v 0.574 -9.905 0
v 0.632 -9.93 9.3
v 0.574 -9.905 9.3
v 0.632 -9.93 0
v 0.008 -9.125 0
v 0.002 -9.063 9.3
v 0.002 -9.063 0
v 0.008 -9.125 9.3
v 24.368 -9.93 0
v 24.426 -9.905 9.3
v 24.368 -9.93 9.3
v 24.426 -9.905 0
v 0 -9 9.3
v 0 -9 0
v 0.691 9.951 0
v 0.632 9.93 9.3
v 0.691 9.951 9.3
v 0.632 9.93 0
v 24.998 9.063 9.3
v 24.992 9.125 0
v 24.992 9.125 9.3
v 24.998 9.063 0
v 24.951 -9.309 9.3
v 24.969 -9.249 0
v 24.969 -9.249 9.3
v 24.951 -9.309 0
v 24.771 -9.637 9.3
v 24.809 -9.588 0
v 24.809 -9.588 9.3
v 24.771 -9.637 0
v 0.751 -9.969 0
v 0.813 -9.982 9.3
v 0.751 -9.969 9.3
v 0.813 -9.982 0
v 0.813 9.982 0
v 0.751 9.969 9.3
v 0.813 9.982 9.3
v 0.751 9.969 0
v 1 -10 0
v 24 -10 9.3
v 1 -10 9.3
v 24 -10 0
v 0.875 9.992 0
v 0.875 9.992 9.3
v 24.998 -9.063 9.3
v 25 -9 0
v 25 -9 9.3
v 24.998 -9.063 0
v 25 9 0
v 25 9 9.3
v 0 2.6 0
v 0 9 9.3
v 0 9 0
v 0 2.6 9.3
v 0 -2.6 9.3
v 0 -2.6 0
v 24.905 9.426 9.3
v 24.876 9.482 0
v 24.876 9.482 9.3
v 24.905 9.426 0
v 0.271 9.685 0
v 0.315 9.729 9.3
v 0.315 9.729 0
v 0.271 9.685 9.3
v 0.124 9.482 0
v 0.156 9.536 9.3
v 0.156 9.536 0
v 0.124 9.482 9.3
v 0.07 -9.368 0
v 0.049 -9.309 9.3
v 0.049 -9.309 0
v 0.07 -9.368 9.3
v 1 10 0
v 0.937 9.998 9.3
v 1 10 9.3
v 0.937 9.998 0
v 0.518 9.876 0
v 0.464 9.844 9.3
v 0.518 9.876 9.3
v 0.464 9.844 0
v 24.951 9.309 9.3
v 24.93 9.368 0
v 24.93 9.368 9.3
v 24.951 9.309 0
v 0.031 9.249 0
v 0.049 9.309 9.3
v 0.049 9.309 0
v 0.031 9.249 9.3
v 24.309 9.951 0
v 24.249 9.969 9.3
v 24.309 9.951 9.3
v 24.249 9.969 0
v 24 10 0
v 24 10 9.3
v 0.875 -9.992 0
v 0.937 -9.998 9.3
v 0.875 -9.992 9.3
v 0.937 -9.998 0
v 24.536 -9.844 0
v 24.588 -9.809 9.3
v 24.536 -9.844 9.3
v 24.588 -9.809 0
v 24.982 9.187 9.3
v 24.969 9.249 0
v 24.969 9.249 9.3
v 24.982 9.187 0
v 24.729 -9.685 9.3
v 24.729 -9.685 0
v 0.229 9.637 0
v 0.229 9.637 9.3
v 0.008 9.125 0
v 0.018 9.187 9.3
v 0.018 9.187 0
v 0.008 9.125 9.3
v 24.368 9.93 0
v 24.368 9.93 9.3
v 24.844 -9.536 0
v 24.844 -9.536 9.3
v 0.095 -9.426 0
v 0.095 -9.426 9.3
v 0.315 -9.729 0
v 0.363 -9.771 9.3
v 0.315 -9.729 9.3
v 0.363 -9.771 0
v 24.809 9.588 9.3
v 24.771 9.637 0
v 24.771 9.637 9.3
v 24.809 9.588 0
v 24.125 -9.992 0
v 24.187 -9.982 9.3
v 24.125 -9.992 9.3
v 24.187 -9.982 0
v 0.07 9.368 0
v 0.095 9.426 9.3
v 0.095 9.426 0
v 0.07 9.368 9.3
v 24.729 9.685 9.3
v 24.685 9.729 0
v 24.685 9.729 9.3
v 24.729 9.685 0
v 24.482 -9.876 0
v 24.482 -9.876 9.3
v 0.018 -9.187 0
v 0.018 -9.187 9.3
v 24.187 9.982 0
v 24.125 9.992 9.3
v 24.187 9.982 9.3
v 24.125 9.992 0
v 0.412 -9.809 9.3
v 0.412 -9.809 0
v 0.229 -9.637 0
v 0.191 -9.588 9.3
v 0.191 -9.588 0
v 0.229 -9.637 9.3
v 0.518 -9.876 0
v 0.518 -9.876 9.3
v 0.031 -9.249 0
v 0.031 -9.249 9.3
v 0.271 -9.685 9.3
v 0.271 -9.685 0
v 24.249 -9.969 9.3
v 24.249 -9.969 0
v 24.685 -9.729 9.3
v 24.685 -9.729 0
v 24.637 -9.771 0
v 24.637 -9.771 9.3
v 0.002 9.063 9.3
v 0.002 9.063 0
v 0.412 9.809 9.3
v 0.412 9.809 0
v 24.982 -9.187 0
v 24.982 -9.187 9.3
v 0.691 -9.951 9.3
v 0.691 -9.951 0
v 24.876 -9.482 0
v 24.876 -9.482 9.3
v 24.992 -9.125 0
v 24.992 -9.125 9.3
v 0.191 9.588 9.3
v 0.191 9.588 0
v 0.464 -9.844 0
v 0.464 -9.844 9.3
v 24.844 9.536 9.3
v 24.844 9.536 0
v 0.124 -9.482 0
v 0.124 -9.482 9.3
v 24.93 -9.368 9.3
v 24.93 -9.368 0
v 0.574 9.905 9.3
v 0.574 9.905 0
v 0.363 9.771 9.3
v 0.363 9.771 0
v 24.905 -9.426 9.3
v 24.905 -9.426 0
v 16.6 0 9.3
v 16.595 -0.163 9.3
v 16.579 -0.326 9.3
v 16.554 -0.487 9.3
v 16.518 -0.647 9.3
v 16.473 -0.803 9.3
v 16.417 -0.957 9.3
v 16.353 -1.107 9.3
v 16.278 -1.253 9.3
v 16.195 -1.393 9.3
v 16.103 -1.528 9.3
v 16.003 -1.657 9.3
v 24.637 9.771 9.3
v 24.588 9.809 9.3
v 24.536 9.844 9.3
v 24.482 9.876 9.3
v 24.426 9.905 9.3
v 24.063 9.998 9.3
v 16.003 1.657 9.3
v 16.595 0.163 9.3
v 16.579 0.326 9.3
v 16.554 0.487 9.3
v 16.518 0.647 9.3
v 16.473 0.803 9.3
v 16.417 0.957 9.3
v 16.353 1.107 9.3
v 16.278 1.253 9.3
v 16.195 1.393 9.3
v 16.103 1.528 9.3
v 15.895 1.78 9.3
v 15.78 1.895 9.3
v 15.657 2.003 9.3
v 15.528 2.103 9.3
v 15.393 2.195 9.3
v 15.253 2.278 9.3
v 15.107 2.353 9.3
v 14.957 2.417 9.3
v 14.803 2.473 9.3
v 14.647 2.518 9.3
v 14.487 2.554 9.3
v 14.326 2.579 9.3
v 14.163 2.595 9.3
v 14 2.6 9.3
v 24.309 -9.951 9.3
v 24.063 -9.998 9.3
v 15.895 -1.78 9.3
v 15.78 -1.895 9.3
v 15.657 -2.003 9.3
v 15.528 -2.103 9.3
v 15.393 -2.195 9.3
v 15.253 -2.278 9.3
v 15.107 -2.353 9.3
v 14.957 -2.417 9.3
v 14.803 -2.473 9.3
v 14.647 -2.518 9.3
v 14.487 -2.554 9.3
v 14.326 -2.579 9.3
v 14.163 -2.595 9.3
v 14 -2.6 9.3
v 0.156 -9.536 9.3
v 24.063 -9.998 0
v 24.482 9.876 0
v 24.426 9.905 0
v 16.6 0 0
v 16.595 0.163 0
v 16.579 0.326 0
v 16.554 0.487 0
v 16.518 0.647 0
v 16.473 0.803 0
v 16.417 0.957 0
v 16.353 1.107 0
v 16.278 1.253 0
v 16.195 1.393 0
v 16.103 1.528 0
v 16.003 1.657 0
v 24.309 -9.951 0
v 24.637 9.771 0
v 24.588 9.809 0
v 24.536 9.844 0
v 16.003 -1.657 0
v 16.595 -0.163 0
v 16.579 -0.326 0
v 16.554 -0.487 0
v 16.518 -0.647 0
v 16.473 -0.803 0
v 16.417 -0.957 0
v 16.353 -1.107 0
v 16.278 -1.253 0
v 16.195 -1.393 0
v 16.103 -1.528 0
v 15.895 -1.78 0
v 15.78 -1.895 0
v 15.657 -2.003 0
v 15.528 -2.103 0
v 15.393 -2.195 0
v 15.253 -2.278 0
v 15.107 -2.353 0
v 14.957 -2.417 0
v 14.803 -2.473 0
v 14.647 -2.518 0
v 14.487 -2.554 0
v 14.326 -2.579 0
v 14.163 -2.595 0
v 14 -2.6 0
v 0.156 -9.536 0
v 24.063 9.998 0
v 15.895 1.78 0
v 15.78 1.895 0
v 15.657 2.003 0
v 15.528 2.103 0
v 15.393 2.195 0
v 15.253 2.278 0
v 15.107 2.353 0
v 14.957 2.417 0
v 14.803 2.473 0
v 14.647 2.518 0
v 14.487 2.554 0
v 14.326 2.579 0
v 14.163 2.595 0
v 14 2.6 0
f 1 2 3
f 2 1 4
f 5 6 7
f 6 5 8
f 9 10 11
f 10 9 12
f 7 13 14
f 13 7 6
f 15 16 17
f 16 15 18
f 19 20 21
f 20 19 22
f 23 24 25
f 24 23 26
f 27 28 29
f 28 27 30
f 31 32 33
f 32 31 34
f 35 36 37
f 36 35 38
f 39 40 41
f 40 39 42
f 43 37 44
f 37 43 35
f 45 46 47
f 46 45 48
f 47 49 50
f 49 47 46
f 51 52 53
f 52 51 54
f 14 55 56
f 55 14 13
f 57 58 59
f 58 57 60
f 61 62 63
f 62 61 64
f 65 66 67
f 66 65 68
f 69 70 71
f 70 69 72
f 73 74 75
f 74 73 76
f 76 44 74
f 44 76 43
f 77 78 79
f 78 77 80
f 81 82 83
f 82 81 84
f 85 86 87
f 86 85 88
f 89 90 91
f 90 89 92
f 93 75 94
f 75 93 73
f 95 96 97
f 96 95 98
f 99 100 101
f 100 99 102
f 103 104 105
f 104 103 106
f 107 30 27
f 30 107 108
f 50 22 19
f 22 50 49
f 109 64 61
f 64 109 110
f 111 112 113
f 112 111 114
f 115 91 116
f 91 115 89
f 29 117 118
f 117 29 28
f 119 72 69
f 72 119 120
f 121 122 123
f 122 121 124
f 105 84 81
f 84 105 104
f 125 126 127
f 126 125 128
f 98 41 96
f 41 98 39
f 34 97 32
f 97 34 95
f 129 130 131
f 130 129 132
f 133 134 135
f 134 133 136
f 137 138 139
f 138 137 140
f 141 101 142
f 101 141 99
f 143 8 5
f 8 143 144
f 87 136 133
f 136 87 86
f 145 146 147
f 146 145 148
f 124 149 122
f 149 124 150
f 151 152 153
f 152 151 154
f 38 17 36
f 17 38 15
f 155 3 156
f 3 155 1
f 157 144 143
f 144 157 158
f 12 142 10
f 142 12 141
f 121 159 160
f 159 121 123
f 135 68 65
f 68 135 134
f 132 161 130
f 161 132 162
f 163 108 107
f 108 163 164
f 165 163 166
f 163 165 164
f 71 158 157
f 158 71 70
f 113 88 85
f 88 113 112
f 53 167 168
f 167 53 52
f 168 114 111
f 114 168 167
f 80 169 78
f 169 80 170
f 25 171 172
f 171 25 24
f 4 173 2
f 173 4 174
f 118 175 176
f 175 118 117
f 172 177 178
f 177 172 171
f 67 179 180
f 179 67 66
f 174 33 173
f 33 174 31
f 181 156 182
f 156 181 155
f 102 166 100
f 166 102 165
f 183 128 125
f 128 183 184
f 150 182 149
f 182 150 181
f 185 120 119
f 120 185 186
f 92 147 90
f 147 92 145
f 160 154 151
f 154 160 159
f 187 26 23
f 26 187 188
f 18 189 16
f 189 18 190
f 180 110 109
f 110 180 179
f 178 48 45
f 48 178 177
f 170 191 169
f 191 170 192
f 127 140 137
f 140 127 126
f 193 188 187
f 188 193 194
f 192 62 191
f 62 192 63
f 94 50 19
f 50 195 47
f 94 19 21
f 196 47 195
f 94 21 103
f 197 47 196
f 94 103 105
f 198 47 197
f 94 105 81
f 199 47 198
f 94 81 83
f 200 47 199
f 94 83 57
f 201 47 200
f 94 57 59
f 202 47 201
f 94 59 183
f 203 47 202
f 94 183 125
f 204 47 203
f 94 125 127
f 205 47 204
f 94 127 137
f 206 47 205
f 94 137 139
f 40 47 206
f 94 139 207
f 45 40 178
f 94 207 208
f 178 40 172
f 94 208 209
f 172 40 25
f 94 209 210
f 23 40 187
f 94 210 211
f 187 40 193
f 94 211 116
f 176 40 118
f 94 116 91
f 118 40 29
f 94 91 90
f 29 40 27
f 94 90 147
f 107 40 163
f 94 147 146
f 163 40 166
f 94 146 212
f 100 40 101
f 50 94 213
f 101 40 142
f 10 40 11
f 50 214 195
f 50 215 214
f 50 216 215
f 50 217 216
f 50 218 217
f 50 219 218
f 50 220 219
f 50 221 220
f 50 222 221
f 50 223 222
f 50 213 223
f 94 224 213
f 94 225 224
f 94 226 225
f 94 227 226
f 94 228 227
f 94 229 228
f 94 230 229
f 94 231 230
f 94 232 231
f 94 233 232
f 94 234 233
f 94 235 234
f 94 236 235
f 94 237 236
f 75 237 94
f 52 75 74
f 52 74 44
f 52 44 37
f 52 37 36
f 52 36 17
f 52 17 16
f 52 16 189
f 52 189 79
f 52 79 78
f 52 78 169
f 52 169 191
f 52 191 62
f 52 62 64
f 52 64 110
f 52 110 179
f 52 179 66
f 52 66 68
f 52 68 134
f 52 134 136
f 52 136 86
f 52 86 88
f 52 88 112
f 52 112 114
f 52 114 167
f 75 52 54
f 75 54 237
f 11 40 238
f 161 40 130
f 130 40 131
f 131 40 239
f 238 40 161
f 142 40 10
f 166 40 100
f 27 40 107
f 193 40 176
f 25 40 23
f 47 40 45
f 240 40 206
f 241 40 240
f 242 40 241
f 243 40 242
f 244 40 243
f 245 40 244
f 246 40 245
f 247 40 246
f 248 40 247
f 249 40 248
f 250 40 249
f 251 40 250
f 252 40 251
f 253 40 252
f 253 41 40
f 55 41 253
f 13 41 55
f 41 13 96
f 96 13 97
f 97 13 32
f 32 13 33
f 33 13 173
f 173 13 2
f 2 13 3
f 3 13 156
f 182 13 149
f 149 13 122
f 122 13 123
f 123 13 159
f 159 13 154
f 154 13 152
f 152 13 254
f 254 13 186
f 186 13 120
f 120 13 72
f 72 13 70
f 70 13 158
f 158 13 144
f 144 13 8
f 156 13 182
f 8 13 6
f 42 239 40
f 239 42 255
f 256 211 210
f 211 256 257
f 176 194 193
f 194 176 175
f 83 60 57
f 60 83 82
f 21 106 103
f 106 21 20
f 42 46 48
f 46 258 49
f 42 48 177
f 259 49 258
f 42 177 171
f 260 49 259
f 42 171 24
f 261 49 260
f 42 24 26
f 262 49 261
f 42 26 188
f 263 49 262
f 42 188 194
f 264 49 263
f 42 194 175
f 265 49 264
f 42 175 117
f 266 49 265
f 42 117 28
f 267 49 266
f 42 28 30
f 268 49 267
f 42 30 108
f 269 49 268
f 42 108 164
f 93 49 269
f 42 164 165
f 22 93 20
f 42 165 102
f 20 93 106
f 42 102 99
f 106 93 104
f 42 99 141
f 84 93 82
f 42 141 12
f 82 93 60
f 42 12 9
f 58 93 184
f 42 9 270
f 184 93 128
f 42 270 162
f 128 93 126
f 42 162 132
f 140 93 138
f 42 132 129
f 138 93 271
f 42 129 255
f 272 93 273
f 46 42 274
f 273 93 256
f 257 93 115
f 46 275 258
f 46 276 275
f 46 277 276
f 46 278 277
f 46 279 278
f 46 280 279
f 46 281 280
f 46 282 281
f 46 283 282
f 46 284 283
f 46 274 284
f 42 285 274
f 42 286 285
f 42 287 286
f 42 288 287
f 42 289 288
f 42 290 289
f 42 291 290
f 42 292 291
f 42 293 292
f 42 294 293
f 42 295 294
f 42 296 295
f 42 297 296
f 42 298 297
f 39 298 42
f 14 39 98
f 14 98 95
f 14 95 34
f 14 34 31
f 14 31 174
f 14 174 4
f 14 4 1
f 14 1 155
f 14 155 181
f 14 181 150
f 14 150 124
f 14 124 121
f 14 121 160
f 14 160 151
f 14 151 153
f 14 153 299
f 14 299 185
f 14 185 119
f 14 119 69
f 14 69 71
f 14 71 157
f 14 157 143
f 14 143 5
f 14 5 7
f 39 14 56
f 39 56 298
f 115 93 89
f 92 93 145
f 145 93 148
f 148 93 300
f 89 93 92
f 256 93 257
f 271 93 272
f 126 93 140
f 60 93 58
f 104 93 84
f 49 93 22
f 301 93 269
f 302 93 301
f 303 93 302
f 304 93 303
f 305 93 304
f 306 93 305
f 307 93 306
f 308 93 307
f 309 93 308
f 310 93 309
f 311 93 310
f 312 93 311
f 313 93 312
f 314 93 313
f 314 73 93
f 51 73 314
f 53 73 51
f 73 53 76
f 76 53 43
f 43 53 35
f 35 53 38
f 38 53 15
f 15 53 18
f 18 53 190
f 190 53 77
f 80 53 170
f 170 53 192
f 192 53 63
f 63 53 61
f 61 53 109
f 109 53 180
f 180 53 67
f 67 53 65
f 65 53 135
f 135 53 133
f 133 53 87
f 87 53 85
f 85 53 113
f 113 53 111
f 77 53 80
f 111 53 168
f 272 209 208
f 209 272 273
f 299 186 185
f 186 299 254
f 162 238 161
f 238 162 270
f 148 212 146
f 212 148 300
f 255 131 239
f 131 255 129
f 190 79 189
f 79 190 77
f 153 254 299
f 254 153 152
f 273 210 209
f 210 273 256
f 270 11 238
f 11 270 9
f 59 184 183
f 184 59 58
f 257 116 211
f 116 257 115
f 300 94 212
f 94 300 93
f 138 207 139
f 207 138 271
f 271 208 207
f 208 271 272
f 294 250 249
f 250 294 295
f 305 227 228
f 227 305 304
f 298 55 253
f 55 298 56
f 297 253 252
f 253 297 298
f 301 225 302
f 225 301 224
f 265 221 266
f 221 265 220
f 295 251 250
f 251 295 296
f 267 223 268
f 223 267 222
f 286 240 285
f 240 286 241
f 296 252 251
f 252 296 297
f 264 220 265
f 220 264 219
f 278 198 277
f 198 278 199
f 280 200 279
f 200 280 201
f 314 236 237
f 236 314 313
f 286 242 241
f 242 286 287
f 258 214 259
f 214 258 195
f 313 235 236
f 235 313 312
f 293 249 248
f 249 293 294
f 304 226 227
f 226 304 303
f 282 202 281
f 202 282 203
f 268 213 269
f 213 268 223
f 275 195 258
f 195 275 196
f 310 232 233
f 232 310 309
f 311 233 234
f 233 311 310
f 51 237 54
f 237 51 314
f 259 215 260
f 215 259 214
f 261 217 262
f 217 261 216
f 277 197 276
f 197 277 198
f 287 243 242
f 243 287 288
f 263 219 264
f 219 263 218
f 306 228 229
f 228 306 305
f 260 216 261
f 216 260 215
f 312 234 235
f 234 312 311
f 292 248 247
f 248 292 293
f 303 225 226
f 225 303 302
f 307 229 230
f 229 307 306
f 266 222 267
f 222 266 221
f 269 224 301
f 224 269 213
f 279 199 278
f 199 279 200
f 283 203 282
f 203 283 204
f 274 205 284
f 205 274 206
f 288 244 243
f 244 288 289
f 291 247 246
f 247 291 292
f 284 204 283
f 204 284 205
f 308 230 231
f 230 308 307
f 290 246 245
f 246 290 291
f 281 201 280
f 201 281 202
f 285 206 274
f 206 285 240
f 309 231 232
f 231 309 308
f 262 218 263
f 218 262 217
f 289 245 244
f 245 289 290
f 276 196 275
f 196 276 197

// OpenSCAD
// file: ../modules/copy_translate.scad
module copy_translate(vec) {
  children();
  translate(vec) children();
}
// file: ../modules/squared_circle.scad
module squared_circle(size, r = 2^-52, center = false) {
  x = is_num(size) ? size : size.x;
  y = is_num(size) ? size : size.y;

  assert(x > 0, "squared_circle x size must be positive");
  assert(y > 0, "squared_circle y size must be positive");
  assert(r > 0, "squared_circle r argument must be positive");
  assert(2 * r <= min(x, y), "squared_circle r argument is too large");
  assert(is_bool(center), "squared_circle center argument must be a boolean");

  translate(center ? [-x / 2, -y / 2] : [0, 0]) hull() {
    translate([r, r]) circle(r = r);
    translate([x - r, r]) circle(r = r);
    translate([x - r, y - r]) circle(r = r);
    translate([r, y - r]) circle(r = r);
  }
}
// main file
use <../modules/squared_circle.scad>
use <../modules/copy_translate.scad>

$fn = 100;

difference() {
  translate([0, -10])
    linear_extrude(height = 9.3)
    squared_circle([25, 20], r = 1);
  // cylinder(d = 20, h = 9.3);

  translate([0, 0, -1]) hull() copy_translate([14, 0]) {
    cylinder(d = 5.2, h = 11);
  }
}
